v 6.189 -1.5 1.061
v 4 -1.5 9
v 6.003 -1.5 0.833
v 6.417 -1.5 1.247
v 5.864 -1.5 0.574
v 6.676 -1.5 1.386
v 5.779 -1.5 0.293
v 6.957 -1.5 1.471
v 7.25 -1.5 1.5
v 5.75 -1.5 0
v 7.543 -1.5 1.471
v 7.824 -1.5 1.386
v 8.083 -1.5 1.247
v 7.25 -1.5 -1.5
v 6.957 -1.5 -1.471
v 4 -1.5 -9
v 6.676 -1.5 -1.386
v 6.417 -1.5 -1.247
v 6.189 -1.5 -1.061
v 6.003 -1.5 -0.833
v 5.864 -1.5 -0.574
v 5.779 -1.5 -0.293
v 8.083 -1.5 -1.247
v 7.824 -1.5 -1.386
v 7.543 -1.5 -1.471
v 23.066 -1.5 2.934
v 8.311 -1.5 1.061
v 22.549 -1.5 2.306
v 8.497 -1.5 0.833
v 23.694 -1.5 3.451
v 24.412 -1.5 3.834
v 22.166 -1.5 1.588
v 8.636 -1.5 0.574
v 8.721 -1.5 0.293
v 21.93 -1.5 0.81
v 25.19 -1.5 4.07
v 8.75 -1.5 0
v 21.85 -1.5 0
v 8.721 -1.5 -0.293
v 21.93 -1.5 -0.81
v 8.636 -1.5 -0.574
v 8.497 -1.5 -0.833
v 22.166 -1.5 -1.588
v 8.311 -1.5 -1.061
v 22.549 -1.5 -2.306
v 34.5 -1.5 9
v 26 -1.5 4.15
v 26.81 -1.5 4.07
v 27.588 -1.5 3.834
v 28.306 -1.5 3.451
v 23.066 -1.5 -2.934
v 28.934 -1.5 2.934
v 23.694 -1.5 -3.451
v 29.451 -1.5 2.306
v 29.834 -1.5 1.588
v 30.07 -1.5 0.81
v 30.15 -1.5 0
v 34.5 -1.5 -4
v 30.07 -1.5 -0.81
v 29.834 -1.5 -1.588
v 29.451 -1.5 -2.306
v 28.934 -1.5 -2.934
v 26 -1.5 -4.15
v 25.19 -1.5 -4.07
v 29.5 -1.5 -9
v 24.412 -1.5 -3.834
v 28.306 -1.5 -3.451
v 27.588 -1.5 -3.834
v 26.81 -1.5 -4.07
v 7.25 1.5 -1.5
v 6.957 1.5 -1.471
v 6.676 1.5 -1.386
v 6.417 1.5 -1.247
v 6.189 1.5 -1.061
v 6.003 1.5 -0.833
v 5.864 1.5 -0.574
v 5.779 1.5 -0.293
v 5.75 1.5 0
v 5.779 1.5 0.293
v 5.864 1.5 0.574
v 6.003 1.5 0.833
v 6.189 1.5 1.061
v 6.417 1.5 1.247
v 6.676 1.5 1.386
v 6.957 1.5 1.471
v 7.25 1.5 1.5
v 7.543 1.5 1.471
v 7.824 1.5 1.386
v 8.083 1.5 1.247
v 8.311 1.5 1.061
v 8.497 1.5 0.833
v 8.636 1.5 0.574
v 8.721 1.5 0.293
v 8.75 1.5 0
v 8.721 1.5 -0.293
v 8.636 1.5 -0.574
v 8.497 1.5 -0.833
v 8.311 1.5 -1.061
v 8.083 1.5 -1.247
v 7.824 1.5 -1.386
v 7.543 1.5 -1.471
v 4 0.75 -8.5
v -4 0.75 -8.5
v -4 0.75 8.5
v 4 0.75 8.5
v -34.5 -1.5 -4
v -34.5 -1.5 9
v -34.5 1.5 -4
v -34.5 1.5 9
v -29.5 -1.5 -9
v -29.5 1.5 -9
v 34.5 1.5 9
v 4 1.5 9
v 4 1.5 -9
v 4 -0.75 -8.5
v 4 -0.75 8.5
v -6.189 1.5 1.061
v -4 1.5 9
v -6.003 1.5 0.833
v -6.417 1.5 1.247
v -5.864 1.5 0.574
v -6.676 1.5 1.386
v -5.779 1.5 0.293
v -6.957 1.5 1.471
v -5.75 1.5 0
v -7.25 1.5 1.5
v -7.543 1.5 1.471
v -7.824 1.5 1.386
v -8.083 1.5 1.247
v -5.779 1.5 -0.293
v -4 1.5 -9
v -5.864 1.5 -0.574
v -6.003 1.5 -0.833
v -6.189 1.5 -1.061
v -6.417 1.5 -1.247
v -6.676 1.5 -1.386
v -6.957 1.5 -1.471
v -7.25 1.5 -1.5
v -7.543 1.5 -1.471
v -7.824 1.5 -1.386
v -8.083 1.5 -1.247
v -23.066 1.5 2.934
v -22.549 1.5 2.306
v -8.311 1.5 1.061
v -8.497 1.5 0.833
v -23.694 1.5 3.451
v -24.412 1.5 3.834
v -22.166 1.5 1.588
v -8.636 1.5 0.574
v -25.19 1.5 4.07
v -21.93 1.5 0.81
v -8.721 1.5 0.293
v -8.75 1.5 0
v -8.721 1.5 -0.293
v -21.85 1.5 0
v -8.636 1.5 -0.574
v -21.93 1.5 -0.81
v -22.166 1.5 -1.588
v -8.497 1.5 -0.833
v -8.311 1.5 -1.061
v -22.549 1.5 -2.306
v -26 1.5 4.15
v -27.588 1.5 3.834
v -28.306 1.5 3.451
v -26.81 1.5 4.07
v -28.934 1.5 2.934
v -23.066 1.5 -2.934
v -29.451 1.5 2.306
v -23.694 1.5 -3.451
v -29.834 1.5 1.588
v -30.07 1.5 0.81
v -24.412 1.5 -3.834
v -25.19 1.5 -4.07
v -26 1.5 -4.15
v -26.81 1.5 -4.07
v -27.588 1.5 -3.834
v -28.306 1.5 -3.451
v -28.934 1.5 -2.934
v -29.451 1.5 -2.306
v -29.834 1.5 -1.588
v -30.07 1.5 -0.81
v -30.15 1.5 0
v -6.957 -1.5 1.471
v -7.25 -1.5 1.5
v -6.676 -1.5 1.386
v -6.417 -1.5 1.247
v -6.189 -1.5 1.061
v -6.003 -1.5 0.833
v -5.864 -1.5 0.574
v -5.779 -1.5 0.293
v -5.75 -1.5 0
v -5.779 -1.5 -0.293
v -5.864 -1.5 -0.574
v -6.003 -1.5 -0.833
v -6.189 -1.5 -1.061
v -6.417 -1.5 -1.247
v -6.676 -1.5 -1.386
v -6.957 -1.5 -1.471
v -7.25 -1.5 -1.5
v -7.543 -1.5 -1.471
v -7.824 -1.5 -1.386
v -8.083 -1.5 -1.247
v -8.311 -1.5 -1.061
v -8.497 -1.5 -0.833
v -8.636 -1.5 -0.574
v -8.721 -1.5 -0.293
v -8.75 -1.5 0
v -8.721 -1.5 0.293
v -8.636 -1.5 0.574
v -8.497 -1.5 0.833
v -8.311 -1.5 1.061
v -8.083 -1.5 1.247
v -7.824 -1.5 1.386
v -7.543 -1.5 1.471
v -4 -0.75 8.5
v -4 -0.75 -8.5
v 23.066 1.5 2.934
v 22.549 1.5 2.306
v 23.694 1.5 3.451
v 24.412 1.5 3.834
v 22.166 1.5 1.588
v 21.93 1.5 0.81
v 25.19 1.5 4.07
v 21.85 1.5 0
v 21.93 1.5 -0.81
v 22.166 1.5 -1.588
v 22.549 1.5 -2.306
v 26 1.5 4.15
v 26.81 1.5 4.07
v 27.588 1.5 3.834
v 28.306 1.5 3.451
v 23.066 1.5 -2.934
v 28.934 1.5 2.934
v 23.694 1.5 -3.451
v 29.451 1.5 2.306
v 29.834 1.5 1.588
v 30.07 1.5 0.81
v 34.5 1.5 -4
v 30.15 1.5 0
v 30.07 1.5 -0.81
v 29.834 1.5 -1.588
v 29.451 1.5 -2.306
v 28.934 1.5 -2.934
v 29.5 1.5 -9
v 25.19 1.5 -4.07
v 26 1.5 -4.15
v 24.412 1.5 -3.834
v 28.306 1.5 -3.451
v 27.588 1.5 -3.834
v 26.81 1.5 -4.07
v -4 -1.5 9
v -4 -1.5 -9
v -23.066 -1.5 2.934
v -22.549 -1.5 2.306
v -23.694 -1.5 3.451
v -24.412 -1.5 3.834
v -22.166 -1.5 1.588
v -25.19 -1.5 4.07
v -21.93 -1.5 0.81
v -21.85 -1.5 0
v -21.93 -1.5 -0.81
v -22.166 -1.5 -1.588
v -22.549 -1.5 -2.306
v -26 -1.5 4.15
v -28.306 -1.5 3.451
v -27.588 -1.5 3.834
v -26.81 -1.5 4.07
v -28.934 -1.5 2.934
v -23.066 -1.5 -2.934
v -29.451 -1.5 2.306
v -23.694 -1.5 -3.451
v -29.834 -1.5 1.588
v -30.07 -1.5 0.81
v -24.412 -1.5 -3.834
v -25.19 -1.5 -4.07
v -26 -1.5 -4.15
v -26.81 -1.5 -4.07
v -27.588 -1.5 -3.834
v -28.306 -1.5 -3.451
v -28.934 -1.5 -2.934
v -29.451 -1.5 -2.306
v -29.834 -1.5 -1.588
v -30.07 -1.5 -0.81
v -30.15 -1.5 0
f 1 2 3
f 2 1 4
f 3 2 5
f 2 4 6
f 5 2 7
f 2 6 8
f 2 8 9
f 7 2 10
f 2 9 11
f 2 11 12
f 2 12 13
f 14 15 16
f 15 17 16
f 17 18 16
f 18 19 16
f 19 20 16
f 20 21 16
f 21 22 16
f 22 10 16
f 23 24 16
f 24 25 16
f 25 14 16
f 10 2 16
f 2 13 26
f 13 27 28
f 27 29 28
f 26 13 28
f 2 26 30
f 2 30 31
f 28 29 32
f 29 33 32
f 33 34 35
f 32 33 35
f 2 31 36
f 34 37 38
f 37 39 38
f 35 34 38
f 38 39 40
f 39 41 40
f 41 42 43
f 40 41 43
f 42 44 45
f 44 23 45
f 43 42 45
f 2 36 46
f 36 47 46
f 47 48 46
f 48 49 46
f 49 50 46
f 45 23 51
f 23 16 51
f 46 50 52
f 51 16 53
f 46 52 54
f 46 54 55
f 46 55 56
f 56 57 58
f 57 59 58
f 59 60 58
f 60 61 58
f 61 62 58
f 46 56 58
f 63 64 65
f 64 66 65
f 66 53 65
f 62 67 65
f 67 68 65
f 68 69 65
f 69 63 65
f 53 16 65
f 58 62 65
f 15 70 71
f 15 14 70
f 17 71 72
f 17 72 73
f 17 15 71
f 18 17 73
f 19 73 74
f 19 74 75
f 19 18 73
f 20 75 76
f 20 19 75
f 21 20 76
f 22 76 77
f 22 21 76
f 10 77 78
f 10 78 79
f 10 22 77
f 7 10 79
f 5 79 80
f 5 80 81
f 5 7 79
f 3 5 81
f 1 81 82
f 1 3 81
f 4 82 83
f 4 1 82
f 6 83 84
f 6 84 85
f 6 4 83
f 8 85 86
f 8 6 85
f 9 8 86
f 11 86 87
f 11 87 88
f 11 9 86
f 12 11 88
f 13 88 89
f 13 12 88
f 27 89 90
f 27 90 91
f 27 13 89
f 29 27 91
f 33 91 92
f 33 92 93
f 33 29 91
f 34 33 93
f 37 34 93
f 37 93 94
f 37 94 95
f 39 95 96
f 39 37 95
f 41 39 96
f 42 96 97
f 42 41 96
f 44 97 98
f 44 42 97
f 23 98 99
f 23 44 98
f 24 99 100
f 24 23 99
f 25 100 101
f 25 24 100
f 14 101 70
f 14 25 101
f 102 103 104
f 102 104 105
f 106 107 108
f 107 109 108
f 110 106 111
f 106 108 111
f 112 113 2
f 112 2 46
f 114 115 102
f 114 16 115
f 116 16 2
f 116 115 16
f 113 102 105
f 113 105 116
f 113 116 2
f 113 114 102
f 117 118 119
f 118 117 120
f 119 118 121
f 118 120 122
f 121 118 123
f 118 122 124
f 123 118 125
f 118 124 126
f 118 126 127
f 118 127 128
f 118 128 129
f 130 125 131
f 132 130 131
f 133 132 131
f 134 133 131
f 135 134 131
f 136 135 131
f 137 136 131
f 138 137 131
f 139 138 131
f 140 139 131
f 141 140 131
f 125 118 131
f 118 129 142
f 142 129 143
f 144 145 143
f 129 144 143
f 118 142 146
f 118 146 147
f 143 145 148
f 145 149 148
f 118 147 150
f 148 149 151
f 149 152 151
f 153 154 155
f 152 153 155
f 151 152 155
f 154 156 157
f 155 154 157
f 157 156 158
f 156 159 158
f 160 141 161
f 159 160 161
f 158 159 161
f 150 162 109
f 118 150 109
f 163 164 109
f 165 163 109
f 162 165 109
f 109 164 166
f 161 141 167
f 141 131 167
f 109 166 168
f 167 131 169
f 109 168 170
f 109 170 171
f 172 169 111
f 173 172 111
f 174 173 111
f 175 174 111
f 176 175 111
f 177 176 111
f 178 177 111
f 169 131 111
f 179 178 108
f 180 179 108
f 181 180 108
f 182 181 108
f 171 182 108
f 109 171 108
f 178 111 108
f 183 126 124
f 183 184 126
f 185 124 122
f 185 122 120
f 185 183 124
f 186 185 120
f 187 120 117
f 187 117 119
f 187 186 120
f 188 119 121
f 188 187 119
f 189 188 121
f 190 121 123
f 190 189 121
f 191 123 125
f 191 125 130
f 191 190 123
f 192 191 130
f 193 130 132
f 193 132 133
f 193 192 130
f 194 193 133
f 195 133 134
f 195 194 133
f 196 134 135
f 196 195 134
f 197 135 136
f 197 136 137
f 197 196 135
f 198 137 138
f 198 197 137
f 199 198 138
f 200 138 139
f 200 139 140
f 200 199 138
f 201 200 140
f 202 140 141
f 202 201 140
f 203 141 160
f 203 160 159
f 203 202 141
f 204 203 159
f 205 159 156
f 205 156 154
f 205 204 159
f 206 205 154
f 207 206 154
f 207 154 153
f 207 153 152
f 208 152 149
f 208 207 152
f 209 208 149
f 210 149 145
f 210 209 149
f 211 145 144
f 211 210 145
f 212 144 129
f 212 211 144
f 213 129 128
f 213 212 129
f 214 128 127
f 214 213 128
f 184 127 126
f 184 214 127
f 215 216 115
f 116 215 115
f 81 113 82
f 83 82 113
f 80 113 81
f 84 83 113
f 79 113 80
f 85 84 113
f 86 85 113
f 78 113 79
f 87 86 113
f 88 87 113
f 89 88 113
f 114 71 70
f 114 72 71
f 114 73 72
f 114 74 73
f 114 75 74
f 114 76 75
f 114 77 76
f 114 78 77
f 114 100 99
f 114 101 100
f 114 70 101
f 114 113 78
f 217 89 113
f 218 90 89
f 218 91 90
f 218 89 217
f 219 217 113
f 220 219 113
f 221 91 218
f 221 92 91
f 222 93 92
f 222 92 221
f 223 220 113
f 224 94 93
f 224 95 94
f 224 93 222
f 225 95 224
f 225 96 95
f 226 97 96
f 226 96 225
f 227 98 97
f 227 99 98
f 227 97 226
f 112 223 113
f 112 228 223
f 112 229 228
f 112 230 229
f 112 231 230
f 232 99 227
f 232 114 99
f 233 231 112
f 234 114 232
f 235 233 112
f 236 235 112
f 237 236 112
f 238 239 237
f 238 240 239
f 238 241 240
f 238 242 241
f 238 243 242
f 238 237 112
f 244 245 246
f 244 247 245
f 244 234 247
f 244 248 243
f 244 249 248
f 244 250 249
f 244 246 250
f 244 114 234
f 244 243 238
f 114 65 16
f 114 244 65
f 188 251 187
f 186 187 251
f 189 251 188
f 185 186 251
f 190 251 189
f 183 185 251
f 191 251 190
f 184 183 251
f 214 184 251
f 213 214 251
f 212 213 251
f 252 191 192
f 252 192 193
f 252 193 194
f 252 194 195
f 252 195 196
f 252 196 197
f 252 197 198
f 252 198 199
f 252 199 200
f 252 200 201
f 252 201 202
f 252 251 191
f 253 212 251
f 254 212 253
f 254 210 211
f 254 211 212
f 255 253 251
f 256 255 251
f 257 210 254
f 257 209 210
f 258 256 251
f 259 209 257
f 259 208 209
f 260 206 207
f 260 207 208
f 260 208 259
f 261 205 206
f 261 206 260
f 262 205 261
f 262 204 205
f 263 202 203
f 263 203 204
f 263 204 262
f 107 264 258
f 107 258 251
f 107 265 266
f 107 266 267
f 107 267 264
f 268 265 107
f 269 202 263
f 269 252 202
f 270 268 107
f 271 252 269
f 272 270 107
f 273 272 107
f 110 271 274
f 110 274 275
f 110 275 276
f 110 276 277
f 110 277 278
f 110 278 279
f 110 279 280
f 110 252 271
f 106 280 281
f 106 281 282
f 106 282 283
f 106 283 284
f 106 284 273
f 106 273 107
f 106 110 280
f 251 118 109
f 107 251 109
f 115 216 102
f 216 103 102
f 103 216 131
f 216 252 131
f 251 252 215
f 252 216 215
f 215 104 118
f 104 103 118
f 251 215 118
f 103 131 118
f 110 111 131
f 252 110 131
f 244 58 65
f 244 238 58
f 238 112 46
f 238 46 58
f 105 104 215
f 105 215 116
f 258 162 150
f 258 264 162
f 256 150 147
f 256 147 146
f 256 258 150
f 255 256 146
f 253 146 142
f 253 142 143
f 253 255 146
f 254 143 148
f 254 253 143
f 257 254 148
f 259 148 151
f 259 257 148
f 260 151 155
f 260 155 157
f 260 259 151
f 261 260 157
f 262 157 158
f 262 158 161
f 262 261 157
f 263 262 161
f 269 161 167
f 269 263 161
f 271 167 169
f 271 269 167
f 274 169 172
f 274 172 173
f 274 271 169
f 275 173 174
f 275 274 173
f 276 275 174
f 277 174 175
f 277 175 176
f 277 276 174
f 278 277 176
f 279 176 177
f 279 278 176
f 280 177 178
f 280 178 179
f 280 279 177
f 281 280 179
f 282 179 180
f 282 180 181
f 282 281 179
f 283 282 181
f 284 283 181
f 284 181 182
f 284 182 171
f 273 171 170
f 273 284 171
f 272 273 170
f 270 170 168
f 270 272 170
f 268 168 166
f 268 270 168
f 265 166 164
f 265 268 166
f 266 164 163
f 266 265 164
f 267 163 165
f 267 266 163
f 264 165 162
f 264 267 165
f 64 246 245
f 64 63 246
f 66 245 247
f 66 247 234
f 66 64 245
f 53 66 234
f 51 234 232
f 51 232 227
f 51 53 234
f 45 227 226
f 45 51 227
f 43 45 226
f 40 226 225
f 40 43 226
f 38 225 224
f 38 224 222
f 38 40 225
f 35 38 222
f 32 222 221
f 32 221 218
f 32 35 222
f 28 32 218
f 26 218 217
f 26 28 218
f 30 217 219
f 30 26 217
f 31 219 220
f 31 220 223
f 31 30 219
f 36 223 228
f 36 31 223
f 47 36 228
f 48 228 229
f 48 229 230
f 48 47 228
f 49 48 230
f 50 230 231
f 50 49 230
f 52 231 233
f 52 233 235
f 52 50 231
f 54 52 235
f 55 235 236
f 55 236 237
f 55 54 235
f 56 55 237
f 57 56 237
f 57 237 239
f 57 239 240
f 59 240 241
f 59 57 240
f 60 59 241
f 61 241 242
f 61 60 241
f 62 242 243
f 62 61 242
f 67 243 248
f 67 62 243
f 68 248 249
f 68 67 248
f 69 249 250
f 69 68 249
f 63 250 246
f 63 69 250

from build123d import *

# Parameters (mm, degrees)
SKETCH1_R             = 4.15
SKETCH1_R_2           = 1.5
BOSS_EXTRUDE1_DEPTH   = 1.5
BOSS_EXTRUDE1_2_DEPTH = 1.5
SKETCH2_W             = 8
SKETCH2_H             = 17
BOSS_EXTRUDE2_DEPTH   = 0.75


with BuildPart() as part:
    # Sketch1 → Boss-Extrude1 (new, symmetric)
    with BuildSketch(Plane(origin=(0, 0, 0), x_dir=(1, 0, 0), z_dir=(0, 1, 0))):
        Polygon((-4, -9), (-34.5, -9), (-34.5, 4), (-29.5, 9), (-4, 9), align=None)
        with Locations(Location((-26, 0, 0), (0, 0, 270))):
            Circle(SKETCH1_R, mode=Mode.SUBTRACT)
        with Locations(Location((-7.25, 0, 0), (0, 0, 270))):
            Circle(SKETCH1_R_2, mode=Mode.SUBTRACT)
    extrude(amount=BOSS_EXTRUDE1_DEPTH, both=True)



with BuildPart() as body_2:
    # Sketch1 → Boss-Extrude1 2 (new, symmetric)
    with BuildSketch(Plane(origin=(0, 0, 0), x_dir=(1, 0, 0), z_dir=(0, 1, 0))):
        Polygon((4, 9), (4, -9), (34.5, -9), (34.5, 4), (29.5, 9), align=None)
        with Locations(Location((7.25, 0, 0), (0, 0, 90))):
            Circle(SKETCH1_R_2, mode=Mode.SUBTRACT)
        with Locations(Location((26, 0, 0), (0, 0, 90))):
            Circle(SKETCH1_R, mode=Mode.SUBTRACT)
    extrude(amount=BOSS_EXTRUDE1_2_DEPTH, both=True)


with BuildPart() as part_1:
    add(part.part)

    add(body_2.part)  # Boss-Extrude2 merges body 2
    # Sketch2 → Boss-Extrude2 (add, symmetric)
    with BuildSketch(Plane(origin=(0, 0, 0), x_dir=(1, 0, 0), z_dir=(0, 1, 0))):
        Rectangle(SKETCH2_W, SKETCH2_H)
    extrude(amount=BOSS_EXTRUDE2_DEPTH, both=True)


solid = part_1.part
